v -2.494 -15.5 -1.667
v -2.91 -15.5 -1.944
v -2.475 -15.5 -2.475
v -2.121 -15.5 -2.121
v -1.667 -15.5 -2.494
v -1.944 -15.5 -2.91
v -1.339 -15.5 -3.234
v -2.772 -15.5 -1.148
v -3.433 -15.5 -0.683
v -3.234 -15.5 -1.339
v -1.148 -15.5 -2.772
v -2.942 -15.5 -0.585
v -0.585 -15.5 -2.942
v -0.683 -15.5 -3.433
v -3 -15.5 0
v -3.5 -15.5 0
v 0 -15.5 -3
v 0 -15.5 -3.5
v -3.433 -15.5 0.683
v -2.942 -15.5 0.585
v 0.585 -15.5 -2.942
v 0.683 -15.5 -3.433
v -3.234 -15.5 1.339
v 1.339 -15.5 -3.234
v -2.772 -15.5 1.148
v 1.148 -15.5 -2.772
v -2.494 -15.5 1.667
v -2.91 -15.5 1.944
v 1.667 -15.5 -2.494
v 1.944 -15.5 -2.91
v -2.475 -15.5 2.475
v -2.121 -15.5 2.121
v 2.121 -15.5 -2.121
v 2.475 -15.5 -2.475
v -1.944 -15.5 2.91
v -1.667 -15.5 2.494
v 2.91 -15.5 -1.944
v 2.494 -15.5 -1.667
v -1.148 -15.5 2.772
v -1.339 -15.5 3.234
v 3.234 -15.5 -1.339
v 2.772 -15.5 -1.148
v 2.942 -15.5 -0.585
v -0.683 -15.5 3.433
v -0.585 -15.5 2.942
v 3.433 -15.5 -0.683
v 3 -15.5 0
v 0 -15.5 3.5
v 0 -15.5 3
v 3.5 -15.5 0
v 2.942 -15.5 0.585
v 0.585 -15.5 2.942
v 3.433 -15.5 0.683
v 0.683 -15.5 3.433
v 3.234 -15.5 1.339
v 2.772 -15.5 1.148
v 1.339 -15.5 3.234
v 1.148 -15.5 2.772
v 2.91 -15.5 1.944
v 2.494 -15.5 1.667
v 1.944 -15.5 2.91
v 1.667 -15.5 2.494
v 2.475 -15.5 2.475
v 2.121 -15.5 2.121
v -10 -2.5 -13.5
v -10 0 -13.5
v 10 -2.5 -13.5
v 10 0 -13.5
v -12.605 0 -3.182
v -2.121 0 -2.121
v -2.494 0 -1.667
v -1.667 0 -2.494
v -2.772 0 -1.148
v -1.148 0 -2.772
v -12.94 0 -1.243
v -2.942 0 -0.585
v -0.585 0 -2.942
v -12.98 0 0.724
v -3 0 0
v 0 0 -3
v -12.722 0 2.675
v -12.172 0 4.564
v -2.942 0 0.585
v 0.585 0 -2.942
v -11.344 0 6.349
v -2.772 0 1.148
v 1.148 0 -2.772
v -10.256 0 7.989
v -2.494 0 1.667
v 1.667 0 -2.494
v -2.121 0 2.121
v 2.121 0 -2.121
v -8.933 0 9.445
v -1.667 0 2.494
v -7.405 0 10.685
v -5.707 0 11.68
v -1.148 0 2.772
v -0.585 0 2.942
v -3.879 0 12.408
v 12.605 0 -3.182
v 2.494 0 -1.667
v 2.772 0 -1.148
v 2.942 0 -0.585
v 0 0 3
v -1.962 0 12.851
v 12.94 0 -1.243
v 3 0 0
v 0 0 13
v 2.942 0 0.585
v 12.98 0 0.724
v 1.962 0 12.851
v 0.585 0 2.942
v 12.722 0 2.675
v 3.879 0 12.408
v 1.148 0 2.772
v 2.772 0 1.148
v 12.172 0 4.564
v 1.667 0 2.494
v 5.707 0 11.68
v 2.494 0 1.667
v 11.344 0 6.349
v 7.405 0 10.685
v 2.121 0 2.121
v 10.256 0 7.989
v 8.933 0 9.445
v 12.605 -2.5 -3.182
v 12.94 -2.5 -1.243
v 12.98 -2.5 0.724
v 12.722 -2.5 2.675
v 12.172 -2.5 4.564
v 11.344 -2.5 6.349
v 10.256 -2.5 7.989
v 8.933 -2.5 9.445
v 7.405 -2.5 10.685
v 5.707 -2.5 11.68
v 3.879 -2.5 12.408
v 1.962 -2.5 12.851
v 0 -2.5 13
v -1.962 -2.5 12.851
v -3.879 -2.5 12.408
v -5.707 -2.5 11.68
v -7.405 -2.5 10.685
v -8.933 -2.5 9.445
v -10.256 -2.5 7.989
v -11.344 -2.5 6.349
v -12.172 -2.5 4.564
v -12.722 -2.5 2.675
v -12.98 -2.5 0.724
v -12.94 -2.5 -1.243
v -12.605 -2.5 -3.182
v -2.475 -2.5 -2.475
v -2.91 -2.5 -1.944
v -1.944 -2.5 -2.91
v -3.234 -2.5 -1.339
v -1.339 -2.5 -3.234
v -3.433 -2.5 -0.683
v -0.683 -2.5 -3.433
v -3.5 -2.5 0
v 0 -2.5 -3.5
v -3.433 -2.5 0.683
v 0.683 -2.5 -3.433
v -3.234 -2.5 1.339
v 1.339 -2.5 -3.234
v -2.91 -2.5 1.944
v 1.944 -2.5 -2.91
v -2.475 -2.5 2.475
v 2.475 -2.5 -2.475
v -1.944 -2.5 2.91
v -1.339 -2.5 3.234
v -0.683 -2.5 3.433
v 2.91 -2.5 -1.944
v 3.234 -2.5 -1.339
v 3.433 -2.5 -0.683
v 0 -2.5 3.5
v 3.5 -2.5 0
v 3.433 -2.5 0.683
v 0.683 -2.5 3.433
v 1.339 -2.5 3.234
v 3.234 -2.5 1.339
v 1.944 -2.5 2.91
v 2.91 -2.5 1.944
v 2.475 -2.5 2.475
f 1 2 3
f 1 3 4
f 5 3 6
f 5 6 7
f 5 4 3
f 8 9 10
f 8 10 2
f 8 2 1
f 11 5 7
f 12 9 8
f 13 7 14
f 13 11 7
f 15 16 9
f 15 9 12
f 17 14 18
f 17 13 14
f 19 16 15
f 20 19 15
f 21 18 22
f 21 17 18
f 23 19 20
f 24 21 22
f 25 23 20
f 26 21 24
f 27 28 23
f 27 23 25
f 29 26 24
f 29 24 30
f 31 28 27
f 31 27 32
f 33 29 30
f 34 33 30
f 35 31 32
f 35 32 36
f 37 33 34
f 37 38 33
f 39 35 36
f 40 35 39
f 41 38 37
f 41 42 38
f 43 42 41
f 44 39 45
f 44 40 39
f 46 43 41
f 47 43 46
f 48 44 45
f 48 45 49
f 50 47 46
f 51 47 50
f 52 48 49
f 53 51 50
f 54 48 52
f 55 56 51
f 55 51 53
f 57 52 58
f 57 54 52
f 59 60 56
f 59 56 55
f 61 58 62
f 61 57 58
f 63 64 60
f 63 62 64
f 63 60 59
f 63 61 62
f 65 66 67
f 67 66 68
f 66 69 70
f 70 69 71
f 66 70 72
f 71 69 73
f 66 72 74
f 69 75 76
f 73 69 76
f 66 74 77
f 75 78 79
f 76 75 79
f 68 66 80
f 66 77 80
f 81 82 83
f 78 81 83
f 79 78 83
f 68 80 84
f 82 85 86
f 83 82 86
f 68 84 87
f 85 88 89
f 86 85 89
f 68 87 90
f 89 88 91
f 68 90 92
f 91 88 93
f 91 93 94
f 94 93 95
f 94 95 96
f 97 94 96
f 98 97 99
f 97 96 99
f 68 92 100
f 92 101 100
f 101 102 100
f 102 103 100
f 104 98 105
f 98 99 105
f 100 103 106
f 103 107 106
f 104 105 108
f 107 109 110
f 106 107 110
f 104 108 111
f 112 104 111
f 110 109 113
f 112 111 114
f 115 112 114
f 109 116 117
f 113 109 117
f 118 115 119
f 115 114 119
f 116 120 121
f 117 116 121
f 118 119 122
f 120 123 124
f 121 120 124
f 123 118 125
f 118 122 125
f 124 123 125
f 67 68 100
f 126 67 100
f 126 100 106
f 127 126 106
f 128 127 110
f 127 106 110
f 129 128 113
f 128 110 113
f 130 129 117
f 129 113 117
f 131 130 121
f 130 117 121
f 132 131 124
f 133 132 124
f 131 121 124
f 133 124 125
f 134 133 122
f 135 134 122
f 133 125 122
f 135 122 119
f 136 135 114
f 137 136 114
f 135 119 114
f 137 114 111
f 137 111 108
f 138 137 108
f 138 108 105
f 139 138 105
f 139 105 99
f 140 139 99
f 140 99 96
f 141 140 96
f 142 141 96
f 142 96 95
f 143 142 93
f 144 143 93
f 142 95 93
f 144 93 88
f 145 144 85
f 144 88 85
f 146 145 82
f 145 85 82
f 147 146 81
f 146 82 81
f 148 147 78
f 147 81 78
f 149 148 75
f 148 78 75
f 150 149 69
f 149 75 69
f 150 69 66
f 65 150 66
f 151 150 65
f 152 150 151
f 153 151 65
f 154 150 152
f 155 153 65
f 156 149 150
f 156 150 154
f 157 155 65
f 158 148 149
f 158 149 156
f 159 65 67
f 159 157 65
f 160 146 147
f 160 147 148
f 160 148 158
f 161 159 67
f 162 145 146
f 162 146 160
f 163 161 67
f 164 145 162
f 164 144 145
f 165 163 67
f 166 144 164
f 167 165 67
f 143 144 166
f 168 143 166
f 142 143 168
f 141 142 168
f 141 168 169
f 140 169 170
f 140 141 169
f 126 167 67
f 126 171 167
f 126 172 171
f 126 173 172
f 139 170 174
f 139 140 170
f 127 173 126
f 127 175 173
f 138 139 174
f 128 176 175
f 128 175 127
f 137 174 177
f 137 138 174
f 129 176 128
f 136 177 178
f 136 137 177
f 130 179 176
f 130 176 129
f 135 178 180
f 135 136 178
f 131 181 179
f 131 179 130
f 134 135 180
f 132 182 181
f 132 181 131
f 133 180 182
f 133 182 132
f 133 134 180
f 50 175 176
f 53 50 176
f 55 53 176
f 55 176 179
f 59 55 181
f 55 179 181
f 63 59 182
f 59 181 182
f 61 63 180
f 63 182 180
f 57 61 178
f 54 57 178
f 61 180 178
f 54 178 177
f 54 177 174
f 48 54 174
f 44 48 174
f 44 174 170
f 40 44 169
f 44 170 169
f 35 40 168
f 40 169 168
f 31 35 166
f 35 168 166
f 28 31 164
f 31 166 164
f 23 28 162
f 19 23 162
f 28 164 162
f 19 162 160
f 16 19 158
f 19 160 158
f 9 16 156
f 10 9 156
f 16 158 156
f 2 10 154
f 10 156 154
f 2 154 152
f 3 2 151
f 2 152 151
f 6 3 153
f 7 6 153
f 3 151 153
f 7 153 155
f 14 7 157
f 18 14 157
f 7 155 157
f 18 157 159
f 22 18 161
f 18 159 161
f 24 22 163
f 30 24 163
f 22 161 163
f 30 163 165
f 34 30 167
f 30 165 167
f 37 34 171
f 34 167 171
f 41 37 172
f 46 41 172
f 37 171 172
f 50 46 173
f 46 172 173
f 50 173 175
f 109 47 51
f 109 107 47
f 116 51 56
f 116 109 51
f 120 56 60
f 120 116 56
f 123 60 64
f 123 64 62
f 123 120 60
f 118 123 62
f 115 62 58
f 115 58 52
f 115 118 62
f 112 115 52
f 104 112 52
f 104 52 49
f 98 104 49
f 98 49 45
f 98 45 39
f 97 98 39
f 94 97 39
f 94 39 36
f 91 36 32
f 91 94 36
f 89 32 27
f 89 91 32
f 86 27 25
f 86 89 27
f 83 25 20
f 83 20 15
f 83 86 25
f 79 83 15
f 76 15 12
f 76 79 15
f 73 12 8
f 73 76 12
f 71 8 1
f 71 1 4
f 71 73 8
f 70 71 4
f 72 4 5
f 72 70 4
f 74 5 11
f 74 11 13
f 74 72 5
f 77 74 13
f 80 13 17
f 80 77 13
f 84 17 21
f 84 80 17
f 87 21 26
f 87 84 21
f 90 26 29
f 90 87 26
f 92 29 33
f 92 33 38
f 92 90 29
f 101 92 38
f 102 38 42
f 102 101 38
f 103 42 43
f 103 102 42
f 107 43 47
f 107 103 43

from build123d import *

# Parameters (mm, degrees)
F0_R     = 3
F1_DEPTH = 2.5
F2_R     = 3.5
F2_R_2   = 3
F3_DEPTH = 13


with BuildPart() as f1:
    # F0 (on Front) → F1 (new body)
    with BuildSketch(Plane.XZ):
        with BuildLine():
            Line((10, -13.5), (12.604617, -3.181765))
            ThreePointArc((12.604617, -3.181765), (0, 13), (-12.604617, -3.181765))
            Line((-12.604617, -3.181765), (-10, -13.5))
            Line((-10, -13.5), (10, -13.5))
        make_face()
        Circle(F0_R, mode=Mode.SUBTRACT)
    extrude(amount=F1_DEPTH)

    # F2 (on face) → F3 (join)
    with BuildSketch(Plane.XZ.offset(2.5)):
        Circle(F2_R)
        Circle(F2_R_2, mode=Mode.SUBTRACT)
    extrude(amount=F3_DEPTH)


solid = f1.part
